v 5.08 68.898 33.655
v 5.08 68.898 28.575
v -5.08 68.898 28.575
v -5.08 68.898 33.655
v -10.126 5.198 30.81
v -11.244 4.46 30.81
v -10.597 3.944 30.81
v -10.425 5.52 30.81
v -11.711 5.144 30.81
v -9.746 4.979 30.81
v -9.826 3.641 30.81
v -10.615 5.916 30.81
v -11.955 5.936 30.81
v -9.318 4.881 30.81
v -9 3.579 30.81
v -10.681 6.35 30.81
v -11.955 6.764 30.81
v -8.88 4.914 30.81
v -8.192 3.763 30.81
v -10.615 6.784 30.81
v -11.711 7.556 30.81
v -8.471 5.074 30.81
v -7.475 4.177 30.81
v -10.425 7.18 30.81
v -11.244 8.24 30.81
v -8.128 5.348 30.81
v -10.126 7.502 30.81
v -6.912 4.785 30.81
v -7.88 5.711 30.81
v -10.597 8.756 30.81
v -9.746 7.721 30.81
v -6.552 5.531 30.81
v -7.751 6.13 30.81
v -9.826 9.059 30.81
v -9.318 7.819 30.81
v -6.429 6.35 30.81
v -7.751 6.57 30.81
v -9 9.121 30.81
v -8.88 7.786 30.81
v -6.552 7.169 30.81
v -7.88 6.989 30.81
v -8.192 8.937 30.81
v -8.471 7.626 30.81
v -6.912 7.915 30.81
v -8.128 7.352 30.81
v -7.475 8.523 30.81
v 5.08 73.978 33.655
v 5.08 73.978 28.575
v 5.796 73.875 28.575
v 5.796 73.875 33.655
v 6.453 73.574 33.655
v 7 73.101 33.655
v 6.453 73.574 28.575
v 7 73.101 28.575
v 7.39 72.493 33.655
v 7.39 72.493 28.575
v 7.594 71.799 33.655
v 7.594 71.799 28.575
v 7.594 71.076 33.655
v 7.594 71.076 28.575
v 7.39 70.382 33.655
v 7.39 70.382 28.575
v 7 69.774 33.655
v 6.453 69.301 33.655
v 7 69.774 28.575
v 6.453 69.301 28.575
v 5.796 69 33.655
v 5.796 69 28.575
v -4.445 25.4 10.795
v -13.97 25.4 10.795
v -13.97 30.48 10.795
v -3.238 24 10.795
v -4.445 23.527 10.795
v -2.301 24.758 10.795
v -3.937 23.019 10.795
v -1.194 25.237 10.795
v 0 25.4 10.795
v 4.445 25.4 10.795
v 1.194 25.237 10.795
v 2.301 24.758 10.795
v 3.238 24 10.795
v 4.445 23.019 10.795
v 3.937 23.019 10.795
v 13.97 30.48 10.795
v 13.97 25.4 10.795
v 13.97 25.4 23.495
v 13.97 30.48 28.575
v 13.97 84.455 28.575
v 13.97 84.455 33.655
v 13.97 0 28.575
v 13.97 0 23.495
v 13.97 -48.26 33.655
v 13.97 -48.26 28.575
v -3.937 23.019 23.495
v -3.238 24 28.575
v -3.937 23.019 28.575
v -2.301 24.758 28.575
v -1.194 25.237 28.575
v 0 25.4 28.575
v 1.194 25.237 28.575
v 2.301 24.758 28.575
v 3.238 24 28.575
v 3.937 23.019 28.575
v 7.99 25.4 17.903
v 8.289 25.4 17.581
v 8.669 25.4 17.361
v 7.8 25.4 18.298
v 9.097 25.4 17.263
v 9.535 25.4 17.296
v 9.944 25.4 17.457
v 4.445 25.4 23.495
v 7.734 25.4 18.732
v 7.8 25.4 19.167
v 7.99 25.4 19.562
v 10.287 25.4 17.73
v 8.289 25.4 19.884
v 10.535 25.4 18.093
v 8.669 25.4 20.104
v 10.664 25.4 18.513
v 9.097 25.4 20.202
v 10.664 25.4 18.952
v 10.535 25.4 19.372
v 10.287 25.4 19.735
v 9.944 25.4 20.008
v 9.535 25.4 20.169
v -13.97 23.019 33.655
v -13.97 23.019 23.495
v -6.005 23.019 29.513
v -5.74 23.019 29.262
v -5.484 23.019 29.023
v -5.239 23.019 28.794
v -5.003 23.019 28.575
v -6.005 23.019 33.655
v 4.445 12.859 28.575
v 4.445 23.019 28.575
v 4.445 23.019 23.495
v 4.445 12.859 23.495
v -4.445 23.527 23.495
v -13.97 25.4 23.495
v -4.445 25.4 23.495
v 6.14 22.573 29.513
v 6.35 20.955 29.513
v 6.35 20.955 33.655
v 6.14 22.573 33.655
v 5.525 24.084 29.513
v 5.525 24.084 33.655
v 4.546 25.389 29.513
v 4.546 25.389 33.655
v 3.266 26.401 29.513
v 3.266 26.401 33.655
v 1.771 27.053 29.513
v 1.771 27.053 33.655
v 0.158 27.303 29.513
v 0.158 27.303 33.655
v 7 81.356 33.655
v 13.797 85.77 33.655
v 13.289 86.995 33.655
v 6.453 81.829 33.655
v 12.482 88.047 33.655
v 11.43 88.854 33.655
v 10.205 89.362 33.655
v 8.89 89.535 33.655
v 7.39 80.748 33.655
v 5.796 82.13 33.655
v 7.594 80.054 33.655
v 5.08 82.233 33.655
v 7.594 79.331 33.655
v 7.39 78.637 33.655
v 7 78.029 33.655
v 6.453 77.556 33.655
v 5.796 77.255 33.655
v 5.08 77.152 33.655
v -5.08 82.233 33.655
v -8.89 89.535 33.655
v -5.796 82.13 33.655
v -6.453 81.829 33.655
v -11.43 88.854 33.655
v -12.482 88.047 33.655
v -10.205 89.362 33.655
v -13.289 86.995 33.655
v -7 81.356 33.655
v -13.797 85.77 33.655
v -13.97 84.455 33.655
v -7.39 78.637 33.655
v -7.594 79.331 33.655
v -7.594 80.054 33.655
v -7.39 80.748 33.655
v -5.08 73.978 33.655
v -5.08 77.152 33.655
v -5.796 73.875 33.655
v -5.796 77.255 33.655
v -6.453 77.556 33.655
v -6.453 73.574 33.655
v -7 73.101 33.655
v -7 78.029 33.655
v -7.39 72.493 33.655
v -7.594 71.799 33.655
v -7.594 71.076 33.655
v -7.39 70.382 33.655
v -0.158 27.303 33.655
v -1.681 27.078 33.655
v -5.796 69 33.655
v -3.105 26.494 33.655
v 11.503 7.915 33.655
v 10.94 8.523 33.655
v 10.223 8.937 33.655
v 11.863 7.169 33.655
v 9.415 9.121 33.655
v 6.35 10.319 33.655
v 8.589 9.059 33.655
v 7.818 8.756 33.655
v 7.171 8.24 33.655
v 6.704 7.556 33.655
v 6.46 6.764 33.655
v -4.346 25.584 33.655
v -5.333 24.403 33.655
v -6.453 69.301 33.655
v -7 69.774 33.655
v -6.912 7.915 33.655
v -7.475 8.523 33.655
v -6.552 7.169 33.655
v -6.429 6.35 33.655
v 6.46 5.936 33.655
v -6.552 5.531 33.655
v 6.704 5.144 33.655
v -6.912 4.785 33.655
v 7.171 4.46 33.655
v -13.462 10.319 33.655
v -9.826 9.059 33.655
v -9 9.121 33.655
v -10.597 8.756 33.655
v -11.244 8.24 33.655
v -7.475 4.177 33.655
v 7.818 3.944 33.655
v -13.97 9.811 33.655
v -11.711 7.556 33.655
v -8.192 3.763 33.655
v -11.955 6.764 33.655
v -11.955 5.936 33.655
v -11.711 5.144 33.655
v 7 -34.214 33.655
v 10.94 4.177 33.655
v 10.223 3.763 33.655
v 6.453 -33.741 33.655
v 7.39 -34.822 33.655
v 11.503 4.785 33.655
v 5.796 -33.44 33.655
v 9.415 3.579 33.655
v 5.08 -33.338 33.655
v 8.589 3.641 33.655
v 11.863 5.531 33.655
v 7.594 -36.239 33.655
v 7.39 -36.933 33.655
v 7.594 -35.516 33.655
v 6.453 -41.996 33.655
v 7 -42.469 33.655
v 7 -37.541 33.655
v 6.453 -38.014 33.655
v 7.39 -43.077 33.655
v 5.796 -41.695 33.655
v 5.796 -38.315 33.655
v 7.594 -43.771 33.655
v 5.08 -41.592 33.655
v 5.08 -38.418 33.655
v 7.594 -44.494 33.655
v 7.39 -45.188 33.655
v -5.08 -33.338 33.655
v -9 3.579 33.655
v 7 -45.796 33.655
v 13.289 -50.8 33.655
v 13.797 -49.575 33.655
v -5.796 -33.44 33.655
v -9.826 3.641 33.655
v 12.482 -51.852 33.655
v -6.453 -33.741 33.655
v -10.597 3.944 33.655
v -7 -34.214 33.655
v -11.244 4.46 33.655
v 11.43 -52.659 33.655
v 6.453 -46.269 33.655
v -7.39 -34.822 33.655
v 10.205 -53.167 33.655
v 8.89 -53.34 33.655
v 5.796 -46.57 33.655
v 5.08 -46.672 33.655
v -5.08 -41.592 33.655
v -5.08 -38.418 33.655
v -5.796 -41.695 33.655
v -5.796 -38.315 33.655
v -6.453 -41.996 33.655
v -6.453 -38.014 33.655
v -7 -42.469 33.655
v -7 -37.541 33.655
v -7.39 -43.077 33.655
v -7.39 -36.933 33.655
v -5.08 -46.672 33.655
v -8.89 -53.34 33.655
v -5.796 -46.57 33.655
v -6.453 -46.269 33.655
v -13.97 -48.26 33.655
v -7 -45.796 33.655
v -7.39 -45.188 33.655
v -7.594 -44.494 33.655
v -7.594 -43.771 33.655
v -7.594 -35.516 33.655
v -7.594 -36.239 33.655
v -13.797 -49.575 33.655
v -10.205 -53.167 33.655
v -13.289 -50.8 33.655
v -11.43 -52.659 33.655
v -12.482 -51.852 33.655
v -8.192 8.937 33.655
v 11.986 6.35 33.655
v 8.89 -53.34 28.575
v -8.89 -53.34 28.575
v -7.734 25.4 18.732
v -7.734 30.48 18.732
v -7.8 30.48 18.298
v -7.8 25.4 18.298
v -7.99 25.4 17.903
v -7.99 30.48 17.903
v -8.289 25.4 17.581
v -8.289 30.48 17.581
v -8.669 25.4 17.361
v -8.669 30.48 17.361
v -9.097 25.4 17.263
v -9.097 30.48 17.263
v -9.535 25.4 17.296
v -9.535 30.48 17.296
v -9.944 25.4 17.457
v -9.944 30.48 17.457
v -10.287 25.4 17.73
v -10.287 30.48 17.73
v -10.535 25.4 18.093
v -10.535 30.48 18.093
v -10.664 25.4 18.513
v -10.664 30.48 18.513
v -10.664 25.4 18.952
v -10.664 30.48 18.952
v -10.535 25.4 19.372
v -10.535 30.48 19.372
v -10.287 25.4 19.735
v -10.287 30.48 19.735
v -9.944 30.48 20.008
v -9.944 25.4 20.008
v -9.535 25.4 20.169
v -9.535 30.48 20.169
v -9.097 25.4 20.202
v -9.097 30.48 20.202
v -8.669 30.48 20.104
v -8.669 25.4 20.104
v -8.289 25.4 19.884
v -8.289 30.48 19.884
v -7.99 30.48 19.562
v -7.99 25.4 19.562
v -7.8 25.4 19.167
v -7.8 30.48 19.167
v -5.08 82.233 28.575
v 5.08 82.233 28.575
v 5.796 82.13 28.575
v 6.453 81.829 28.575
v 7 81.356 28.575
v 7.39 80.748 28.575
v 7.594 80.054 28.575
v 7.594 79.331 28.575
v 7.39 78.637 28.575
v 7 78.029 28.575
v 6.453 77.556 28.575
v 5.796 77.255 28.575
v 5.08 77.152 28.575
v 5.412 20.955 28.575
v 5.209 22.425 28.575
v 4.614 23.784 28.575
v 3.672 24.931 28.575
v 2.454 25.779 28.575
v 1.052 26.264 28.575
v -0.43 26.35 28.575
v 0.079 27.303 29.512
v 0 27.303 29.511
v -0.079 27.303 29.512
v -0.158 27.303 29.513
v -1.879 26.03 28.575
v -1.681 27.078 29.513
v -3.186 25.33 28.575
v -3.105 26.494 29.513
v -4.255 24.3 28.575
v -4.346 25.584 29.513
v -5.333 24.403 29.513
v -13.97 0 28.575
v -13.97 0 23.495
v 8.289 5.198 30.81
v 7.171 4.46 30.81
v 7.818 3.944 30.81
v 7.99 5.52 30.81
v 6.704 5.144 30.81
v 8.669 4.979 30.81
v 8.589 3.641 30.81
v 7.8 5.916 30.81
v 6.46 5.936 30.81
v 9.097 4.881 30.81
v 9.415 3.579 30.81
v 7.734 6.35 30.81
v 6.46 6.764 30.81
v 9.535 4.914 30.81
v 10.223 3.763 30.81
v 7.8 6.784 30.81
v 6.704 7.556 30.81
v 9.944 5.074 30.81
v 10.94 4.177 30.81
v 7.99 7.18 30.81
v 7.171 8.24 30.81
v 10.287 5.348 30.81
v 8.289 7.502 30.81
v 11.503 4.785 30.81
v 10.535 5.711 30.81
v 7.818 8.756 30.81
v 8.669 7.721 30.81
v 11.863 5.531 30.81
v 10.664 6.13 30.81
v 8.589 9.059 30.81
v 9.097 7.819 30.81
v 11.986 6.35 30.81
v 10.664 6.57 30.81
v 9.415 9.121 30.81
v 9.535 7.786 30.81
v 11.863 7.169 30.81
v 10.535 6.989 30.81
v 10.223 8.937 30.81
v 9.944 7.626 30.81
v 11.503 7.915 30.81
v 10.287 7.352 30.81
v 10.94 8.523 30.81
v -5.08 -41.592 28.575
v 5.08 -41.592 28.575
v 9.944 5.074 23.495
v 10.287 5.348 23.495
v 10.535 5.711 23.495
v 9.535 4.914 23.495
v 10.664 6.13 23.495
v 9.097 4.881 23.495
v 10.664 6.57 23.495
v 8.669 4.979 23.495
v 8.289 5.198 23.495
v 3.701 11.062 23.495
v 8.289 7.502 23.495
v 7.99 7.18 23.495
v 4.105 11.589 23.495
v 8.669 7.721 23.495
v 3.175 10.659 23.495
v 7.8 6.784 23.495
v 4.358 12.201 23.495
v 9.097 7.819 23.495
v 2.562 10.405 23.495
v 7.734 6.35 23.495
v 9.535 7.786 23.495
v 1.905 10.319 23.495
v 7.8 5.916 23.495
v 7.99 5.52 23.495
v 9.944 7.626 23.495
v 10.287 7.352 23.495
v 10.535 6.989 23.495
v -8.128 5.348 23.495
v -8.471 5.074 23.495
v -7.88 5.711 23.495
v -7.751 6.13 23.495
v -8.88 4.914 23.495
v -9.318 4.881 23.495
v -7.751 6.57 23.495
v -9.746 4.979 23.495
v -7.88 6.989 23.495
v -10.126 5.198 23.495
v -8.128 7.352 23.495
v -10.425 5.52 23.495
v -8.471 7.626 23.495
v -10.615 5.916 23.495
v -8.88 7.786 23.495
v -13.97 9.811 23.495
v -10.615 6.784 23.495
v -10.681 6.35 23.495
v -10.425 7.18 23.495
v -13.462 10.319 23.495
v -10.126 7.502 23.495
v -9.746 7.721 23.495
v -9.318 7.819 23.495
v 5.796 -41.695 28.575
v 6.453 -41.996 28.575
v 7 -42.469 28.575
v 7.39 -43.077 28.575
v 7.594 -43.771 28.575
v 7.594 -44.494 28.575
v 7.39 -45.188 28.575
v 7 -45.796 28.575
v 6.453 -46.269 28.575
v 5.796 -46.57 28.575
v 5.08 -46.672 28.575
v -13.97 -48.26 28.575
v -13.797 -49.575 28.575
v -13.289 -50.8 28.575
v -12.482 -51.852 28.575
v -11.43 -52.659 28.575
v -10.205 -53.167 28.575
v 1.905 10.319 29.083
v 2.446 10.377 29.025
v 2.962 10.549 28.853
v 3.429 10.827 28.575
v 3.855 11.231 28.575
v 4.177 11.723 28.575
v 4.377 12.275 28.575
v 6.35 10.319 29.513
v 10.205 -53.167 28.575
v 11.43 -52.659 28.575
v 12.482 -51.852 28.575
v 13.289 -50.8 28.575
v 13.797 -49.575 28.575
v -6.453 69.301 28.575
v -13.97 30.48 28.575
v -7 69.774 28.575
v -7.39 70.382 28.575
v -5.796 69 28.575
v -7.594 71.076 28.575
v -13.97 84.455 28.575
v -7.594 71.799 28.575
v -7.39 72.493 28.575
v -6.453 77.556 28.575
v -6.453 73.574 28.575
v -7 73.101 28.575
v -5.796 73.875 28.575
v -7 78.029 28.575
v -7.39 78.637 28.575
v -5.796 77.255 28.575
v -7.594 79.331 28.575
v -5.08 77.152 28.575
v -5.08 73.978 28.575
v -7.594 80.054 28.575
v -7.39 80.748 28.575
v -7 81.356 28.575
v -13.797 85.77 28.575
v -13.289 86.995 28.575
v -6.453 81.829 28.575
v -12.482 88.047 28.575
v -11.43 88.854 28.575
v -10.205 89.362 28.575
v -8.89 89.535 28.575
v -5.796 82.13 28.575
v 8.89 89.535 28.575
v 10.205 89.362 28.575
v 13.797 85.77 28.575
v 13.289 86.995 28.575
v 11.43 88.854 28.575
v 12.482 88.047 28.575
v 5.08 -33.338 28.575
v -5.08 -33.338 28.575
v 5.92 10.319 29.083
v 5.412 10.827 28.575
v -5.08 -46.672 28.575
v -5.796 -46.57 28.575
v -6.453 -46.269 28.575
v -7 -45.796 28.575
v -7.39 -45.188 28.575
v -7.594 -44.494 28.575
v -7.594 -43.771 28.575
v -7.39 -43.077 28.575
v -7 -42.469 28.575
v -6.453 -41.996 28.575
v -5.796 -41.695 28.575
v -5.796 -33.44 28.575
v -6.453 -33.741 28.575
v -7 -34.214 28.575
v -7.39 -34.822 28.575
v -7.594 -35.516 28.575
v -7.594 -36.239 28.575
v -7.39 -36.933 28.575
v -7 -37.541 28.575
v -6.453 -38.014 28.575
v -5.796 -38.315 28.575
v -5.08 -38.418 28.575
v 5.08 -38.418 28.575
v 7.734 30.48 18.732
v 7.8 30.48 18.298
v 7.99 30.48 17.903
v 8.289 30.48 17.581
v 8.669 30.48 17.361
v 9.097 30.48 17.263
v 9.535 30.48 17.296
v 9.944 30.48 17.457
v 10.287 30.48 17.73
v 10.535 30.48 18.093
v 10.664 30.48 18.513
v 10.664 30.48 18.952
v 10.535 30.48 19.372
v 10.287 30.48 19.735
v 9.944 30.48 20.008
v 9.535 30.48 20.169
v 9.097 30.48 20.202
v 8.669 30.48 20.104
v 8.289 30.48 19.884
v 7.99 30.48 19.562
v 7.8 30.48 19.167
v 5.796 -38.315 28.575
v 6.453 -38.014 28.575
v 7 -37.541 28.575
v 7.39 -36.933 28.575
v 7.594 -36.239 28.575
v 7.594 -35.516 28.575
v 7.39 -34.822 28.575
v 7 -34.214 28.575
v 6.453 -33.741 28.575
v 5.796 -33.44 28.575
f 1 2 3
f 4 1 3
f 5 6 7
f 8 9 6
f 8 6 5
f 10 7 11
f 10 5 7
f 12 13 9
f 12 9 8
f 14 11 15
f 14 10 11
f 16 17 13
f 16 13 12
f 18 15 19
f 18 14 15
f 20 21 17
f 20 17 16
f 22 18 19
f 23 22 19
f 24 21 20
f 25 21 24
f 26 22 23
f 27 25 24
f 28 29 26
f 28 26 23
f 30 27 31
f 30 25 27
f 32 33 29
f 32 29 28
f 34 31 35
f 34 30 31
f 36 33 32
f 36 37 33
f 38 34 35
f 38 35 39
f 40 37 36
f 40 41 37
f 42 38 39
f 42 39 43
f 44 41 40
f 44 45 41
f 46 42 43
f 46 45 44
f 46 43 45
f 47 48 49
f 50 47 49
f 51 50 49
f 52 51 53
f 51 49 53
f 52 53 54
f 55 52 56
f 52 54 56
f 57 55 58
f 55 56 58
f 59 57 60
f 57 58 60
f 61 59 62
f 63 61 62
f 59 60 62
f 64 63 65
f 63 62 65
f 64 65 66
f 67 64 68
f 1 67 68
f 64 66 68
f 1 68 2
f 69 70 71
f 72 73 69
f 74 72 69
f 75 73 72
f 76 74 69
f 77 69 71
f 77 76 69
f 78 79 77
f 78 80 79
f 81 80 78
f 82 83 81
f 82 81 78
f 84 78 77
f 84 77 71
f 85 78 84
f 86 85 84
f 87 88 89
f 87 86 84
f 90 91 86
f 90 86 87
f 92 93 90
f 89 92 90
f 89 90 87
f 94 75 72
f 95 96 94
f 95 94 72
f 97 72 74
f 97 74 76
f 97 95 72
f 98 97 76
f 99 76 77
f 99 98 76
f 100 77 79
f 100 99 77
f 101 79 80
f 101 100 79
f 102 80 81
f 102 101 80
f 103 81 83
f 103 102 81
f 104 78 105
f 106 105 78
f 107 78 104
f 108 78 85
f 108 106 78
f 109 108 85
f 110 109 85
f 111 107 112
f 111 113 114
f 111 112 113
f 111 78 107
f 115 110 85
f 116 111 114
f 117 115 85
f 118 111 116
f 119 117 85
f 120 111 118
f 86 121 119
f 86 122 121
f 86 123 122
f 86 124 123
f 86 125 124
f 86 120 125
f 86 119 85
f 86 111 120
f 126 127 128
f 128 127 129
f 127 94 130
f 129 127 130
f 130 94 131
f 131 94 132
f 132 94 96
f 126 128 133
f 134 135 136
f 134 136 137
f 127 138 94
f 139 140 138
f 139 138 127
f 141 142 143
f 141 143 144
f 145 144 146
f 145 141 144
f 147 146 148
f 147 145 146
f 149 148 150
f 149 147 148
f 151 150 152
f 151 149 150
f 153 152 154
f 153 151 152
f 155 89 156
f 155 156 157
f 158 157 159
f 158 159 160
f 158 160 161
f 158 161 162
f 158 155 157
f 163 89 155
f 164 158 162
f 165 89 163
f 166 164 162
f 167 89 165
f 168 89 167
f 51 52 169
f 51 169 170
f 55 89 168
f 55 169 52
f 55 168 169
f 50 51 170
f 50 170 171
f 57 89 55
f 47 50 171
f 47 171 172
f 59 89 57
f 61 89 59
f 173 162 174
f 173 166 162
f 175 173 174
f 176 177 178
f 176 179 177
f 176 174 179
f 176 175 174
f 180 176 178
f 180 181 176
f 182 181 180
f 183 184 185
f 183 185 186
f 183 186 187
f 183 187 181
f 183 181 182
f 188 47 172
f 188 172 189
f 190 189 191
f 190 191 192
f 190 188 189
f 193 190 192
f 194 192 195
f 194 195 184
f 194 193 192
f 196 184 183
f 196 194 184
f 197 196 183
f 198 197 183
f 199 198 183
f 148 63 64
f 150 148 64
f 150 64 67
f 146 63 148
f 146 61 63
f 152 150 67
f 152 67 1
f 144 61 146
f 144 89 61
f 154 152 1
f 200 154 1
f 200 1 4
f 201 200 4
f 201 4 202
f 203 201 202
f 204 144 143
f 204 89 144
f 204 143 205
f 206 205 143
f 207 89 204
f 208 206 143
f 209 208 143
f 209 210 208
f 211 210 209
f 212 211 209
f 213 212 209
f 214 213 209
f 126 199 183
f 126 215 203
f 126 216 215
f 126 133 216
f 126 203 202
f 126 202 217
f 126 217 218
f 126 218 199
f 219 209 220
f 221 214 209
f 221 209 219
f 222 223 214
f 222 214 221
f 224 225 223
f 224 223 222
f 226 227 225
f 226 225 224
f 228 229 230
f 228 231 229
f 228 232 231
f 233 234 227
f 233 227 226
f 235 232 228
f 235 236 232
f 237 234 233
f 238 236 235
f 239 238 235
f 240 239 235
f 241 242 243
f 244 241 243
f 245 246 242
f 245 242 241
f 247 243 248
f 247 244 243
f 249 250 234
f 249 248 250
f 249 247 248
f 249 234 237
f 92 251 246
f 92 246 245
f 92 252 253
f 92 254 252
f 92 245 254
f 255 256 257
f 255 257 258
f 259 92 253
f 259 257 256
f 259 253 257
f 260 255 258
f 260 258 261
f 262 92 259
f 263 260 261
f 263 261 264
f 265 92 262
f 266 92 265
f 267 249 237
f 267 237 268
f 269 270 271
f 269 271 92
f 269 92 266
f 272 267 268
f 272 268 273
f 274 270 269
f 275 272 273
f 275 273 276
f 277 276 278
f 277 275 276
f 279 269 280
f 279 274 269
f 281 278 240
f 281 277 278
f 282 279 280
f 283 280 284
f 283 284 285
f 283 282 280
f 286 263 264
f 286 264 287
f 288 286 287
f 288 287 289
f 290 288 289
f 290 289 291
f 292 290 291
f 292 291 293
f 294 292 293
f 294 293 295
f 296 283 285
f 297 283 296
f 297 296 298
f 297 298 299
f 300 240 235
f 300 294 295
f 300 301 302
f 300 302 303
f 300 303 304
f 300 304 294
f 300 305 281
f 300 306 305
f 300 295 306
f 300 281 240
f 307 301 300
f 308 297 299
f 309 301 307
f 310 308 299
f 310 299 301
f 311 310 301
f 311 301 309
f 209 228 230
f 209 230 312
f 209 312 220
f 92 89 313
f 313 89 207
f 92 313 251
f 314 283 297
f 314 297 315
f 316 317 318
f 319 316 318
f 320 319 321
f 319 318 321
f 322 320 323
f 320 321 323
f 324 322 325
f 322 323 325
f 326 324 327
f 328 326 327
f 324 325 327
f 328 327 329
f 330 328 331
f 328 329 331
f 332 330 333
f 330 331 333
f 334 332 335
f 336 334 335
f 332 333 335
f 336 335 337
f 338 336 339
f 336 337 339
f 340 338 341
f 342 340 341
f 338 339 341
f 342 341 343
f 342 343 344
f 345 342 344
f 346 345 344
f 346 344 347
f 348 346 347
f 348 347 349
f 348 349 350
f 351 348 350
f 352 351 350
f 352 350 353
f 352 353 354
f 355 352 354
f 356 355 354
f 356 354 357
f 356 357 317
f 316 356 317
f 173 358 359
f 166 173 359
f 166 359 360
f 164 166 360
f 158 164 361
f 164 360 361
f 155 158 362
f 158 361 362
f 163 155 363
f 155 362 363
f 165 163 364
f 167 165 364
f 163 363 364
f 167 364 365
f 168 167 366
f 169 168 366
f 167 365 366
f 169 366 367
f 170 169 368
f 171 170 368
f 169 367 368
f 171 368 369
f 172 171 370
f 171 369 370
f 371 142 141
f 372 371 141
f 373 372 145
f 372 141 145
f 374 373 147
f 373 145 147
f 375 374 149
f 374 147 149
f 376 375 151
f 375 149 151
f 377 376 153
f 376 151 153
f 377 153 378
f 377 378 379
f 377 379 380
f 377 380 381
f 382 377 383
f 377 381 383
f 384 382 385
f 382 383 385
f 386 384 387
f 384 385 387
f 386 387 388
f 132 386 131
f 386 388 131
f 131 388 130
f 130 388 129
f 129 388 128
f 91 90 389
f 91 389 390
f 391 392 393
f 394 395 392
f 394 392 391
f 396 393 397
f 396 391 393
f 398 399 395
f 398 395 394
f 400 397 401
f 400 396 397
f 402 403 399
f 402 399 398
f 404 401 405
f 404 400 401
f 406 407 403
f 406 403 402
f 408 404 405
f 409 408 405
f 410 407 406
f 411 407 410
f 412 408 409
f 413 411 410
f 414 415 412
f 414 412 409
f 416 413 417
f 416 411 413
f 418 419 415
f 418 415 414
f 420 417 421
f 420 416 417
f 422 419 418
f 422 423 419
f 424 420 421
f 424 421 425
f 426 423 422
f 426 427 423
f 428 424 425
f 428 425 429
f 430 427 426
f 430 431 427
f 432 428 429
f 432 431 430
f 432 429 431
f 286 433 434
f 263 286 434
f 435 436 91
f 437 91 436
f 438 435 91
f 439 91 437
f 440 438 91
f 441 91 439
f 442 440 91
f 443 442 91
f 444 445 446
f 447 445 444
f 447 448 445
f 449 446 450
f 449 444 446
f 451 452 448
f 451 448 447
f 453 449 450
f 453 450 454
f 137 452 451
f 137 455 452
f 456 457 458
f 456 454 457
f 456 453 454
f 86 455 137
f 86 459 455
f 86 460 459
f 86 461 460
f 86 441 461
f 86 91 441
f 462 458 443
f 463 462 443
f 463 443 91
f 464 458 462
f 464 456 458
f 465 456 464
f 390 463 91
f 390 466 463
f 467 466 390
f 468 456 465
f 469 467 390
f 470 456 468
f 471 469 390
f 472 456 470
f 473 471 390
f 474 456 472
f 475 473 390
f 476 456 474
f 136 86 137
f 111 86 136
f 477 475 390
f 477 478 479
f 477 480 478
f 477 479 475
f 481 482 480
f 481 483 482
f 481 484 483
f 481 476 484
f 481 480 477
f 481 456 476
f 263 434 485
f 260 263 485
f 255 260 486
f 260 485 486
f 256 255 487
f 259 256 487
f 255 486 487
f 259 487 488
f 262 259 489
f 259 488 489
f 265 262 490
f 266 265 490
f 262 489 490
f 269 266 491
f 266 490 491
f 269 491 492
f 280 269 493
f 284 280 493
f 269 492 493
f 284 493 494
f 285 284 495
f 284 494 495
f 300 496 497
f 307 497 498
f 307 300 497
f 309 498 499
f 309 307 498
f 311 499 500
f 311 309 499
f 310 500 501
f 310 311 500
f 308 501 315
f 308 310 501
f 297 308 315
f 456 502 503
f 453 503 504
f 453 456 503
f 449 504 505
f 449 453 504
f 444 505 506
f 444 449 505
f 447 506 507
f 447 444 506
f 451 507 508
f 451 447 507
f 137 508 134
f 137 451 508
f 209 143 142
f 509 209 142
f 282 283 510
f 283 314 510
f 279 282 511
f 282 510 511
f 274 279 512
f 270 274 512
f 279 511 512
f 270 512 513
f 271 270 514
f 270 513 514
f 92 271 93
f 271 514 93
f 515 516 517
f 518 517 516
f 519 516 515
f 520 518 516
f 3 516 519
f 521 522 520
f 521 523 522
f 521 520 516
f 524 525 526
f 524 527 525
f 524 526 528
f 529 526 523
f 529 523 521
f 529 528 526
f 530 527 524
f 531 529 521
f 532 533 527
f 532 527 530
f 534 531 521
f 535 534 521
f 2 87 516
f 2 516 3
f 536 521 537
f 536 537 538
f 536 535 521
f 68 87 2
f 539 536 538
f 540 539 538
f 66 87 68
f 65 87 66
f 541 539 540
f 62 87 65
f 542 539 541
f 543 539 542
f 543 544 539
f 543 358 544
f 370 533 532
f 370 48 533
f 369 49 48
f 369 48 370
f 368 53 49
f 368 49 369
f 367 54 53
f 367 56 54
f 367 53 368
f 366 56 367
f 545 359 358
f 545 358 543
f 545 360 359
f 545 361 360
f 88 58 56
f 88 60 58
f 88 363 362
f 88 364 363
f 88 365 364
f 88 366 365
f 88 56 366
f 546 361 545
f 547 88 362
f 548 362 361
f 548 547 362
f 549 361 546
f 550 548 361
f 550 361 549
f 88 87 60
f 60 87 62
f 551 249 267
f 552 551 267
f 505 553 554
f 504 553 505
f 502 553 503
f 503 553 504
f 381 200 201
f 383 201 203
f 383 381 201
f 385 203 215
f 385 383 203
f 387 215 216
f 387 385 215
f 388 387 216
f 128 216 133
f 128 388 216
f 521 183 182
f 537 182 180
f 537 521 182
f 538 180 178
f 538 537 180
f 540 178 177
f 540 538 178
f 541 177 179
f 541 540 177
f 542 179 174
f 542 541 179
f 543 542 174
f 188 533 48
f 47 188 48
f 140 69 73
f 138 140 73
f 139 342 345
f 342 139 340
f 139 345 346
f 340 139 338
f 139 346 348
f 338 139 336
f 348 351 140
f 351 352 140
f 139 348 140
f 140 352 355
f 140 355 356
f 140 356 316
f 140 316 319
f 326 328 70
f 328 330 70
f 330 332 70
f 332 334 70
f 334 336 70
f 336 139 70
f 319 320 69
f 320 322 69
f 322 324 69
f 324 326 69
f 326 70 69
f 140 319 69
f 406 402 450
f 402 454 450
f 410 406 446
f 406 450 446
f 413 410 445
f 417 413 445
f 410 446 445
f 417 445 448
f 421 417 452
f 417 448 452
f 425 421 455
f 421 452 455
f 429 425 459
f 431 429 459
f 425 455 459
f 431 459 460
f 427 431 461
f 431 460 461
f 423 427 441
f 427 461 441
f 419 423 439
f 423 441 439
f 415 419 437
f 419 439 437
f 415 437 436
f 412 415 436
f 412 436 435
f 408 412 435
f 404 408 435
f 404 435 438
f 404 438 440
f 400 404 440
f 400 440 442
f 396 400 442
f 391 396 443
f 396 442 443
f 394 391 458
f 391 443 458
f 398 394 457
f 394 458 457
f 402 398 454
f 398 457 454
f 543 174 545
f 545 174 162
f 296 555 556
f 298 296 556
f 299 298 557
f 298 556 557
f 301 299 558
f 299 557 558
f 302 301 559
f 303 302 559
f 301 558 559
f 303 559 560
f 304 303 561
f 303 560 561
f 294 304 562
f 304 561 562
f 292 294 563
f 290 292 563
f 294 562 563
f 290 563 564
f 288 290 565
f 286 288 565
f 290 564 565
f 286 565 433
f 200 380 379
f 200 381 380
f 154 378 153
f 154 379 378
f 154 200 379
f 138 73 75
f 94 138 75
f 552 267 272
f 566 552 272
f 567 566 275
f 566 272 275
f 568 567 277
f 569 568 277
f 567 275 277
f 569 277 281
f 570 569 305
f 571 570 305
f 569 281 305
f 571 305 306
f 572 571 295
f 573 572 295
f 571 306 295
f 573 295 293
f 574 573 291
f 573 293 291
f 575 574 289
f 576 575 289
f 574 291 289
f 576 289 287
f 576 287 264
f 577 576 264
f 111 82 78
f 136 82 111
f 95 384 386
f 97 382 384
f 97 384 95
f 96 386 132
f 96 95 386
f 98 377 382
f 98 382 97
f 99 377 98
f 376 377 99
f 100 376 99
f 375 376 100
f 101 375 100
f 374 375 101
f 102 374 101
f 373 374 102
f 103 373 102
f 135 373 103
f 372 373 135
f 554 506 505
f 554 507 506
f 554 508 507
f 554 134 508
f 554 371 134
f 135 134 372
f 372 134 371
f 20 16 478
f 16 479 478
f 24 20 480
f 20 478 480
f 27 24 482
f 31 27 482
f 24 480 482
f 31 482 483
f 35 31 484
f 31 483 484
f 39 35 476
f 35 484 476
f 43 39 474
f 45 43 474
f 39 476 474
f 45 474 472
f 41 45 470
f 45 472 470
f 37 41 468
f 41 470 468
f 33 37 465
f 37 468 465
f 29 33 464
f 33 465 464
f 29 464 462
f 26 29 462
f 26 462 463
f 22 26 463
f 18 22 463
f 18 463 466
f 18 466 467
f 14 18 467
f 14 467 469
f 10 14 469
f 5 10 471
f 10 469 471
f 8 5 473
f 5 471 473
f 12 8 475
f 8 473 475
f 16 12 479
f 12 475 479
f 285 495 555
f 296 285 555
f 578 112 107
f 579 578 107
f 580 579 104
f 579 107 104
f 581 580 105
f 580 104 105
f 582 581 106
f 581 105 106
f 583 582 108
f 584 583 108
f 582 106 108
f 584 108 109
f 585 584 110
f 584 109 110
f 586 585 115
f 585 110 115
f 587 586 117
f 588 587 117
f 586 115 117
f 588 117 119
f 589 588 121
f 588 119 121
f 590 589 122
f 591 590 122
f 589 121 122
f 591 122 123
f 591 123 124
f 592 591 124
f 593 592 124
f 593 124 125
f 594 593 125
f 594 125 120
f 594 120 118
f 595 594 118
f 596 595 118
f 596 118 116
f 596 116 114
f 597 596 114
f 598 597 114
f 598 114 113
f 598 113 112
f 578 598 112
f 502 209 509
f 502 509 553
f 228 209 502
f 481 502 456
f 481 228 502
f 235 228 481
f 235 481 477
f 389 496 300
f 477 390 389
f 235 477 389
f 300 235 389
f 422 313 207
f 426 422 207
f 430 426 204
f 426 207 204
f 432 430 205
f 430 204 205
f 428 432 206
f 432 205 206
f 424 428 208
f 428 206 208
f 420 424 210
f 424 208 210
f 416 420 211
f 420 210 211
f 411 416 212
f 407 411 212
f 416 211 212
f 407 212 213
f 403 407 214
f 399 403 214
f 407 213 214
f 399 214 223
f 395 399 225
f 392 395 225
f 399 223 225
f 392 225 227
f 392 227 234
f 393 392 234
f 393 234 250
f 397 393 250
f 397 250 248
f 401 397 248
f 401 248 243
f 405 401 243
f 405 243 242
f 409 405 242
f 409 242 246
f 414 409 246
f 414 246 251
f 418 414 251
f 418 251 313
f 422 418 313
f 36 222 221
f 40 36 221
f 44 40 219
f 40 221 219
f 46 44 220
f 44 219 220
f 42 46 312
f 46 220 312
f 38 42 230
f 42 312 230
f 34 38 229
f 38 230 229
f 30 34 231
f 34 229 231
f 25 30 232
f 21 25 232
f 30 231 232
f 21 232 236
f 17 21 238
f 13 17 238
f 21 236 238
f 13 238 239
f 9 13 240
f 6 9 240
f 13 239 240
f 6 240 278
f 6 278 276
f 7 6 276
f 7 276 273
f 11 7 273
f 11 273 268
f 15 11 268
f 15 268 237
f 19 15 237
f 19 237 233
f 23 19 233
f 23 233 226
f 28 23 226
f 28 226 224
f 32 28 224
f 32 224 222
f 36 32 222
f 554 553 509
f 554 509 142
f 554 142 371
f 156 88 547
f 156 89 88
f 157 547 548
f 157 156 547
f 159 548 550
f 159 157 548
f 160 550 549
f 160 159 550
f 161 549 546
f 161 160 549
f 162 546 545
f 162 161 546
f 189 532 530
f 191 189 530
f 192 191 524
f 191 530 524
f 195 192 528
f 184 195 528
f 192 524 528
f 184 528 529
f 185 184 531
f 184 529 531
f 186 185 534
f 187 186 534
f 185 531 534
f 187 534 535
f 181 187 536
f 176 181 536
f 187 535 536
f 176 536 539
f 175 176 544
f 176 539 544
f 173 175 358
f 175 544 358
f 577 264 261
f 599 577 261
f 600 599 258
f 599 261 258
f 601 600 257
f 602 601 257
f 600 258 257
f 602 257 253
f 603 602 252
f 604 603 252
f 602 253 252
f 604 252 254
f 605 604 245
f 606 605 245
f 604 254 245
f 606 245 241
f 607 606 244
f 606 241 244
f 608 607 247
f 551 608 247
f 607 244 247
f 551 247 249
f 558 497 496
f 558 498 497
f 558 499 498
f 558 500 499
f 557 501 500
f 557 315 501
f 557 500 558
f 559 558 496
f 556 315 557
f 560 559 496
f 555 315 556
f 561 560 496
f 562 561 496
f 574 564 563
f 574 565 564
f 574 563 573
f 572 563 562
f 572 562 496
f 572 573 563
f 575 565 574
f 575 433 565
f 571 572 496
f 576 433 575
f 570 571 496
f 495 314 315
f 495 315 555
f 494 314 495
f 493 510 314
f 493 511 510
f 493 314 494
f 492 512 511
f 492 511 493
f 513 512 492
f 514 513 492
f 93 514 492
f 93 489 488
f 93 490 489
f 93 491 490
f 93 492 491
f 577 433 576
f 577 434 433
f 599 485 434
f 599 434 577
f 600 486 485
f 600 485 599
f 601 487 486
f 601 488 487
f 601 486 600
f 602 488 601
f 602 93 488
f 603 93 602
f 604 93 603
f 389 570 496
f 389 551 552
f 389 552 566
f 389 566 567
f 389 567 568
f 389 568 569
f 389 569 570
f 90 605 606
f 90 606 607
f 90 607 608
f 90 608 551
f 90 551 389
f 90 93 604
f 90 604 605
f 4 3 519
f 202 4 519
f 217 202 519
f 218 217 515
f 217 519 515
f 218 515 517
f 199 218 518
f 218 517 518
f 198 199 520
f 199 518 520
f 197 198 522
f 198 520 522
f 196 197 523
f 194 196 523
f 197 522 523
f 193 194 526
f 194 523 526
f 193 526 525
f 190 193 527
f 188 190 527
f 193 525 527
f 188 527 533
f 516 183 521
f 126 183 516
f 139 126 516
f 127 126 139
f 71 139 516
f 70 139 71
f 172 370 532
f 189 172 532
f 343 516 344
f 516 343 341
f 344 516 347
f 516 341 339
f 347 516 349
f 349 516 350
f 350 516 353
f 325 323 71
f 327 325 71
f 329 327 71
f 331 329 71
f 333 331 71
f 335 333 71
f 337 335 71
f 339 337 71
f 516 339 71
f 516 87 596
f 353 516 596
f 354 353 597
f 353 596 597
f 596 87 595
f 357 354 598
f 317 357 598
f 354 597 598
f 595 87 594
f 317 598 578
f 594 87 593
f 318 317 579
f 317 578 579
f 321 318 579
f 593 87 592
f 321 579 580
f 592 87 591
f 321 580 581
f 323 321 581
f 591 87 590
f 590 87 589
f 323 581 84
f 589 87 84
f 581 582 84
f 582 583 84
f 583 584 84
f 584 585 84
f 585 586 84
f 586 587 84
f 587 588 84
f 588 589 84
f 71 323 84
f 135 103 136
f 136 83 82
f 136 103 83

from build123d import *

# Parameters (mm, degrees)
BOSS_EXTRUDE1_DEPTH                                = 5.080000000000001
SKETCH2_W                                          = 5.079999999999998
SKETCH2_H                                          = 0.5079999999999831
BOSS_EXTRUDE2_DEPTH                                = 17.907000000000004
BOSS_EXTRUDE3_DEPTH                                = 1.9049999999999987
BOSS_EXTRUDE4_DEPTH                                = 17.779999999999998
SKETCH5_W                                          = 20.31999999999999
SKETCH5_H                                          = 22.859999999999992
BOSS_EXTRUDE5_DEPTH                                = 63.1505057547775
BOSS_EXTRUDE6_DEPTH                                = 10.03299999999999
BOSS_EXTRUDE7_DEPTH                                = 5.079999999999997
SKETCH8_W                                          = 22.859999999999992
SKETCH8_H                                          = 80.6430229523153
BOSS_EXTRUDE8_DEPTH                                = 7.619999999999997
CUT_EXTRUDE1_DEPTH                                 = 12.699999999999996
CUT_EXTRUDE2_DEPTH                                 = 12.699999999999998
BOSS_EXTRUDE9_DEPTH                                = 5.079999999999997
BOSS_EXTRUDE10_DEPTH                               = 62.23197704768469
SKETCH13_W                                         = 9.524999999999991
SKETCH13_H                                         = 12.699999999999998
CUT_EXTRUDE3_DEPTH                                 = 2.381494245222503
SKETCH14_W                                         = 17.779999999999994
SKETCH14_H                                         = 59.05499999999999
CUT_EXTRUDE4_DEPTH                                 = 100.64847640581364
SKETCH15_W                                         = 5.079999999999998
SKETCH15_H                                         = 53.339999999999996
CUT_EXTRUDE5_DEPTH                                 = 100.64847640581364
CUT_EXTRUDE6_DEPTH                                 = 93.34611808300336
CUT_EXTRUDE7_DEPTH                                 = 94.45724543875664
CUT_EXTRUDE8_DEPTH                                 = 93.34611808300336
CUT_EXTRUDE9_DEPTH                                 = 93.34611808300336
CBORE_FOR_M2_5_HEX_HEAD_MACHINE_SCREW1_D           = 2.9464
CBORE_FOR_M2_5_HEX_HEAD_MACHINE_SCREW1_DEPTH       = 22.86
CBORE_FOR_M2_5_HEX_HEAD_MACHINE_SCREW1_CBORE_D     = 5.55752
CBORE_FOR_M2_5_HEX_HEAD_MACHINE_SCREW1_CBORE_DEPTH = 2.8448
M2_5_CLEARANCE_HOLE1_D                             = 2.9464
M2_5_CLEARANCE_HOLE1_DEPTH                         = 83.82
M2_5_CLEARANCE_HOLE2_D                             = 2.9464
M2_5_CLEARANCE_HOLE2_DEPTH                         = 64.135
FILLET2_R                                          = 2.540000000000001
CHAMFER2_SIZE                                      = 0.938019803
FILLET3_R                                          = 5.079999999999999


with BuildPart() as part:
    # Sketch1 → Boss-Extrude1 (new body)
    with BuildSketch(Plane.XY.offset(33.654999999999994)):
        Polygon((-13.96999999999999, 9.810505754777516), (-13.461999999999998, 9.810505754777516), (-13.461999999999998, 10.3185057547775), align=None)
    extrude(amount=-BOSS_EXTRUDE1_DEPTH)

    # Sketch2 → Boss-Extrude2 (add)
    with BuildSketch(Plane(origin=(-13.461999999999998, 0, 0), x_dir=(0, 0, -1), z_dir=(1, 0, 0))):
        with Locations((-31.114999999999995, 10.064505754777507)):
            Rectangle(SKETCH2_W, SKETCH2_H)
    extrude(amount=BOSS_EXTRUDE2_DEPTH)

    # Sketch3 → Boss-Extrude3 (add)
    with BuildSketch(Plane(origin=(4.445000000000005, 0, 0), x_dir=(0, 0, -1), z_dir=(1, 0, 0))):
        Polygon((-28.574999999999996, 9.810505754777516), (-33.654999999999994, 9.810505754777516), (-33.654999999999994, 10.3185057547775), (-29.083000000000002, 10.3185057547775), (-28.574999999999996, 10.826505754777498), align=None)
    extrude(amount=BOSS_EXTRUDE3_DEPTH)

    # Sketch4 → Boss-Extrude4 (add)
    with BuildSketch(Plane(origin=(0, 0, 28.574999999999996), x_dir=(-1, 0, 0), z_dir=(0, 0, -1))):
        with BuildLine():
            Line((-6.3500000000000005, 9.810505754777516), (-6.349999999999998, 27.303022952315306))
            Line((-6.349999999999998, 27.303022952315306), (3.93700000000001, 27.303022952315306))
            Line((3.93700000000001, 27.303022952315306), (3.93700000000001, 23.0185057547775))
            ThreePointArc((3.93700000000001, 23.0185057547775), (-2.14e-15, 25.399999999999995), (-3.9370000000000167, 23.0185057547775))
            Line((-3.9370000000000167, 23.0185057547775), (-4.445000000000012, 23.0185057547775))
            Line((-4.445000000000012, 23.0185057547775), (-4.445000000000001, 10.3185057547775))
            Line((-4.445000000000001, 10.3185057547775), (13.46200000000004, 10.3185057547775))
            Line((13.46200000000004, 10.3185057547775), (13.969999999999992, 9.810505754777516))
            Line((13.969999999999992, 9.810505754777516), (-6.3500000000000005, 9.810505754777516))
        make_face()
    extrude(amount=BOSS_EXTRUDE4_DEPTH)

    # Sketch5 → Boss-Extrude5 (add)
    with BuildSketch(Plane.XZ.offset(-9.810505754777516)):
        with Locations((-3.8099999999999947, 22.224999999999998)):
            Rectangle(SKETCH5_W, SKETCH5_H)
    extrude(amount=BOSS_EXTRUDE5_DEPTH)

    # Sketch6 → Boss-Extrude6 (add)
    with BuildSketch(Plane.ZY.offset(3.93700000000001)):
        Polygon((28.575, 23.0185057547775), (10.795, 23.0185057547775), (10.794999999999998, 27.303022952315306), (28.575, 27.303022952315306), align=None)
    extrude(amount=BOSS_EXTRUDE6_DEPTH)

    # Sketch7 → Boss-Extrude7 (add)
    with BuildSketch(Plane.XY.offset(28.574999999999996)):
        with BuildLine():
            Line((0.15844430213195376, 27.303022952315306), (6.3500000000000005, 27.303022952315306))
            Line((6.3500000000000005, 27.303022952315306), (6.3500000000000005, 20.955000000000002))
            ThreePointArc((6.3500000000000005, 20.955000000000002), (4.545801432010527, 25.38875566994067), (0.15844430213195376, 27.303022952315306))
        make_face()
    extrude(amount=BOSS_EXTRUDE7_DEPTH)

    # Sketch8 → Boss-Extrude8 (add)
    with BuildSketch(Plane(origin=(6.350000000000003, 0, 0), x_dir=(0, 0, -1), z_dir=(1, 0, 0))):
        with Locations((-22.224999999999998, -13.018488523842345)):
            Rectangle(SKETCH8_W, SKETCH8_H)
    extrude(amount=BOSS_EXTRUDE8_DEPTH)

    # Sketch9 → Cut-Extrude1 (cut)
    with BuildSketch(Plane(origin=(0, 0, 10.794999999999998), x_dir=(-1, 0, 0), z_dir=(0, 0, -1))):
        Polygon((13.97, 25.4), (4.44500000000001, 25.4), (4.445000000000009, 23.526505754777506), (3.9369999999999985, 23.0185057547775), (13.97, 23.0185057547775), align=None)
    extrude(amount=-CUT_EXTRUDE1_DEPTH, mode=Mode.SUBTRACT)

    # Sketch10 → Cut-Extrude2 (cut)
    with BuildSketch(Plane(origin=(0, 0, 10.794999999999998), x_dir=(-1, 0, 0), z_dir=(0, 0, -1))):
        Polygon((-4.445000000000001, 10.3185057547775), (-4.44500000000001, 23.018505754777497), (-13.97, 23.018505754777497), (-13.97, -53.339999999999996), (13.969999999999992, -53.339999999999996), (13.970000000000004, 9.81050575477752), (13.46200000000004, 10.3185057547775), align=None)
    extrude(amount=-CUT_EXTRUDE2_DEPTH, mode=Mode.SUBTRACT)

    # Sketch11 → Boss-Extrude9 (add)
    with BuildSketch(Plane.XY.offset(28.574999999999996)):
        with BuildLine():
            Line((-6.005367932108752, 23.0185057547775), (-13.97, 23.0185057547775))
            Line((-13.97, 23.0185057547775), (-13.97, 27.303022952315306))
            Line((-13.97, 27.303022952315306), (-0.15844430213195376, 27.303022952315306))
            ThreePointArc((-0.15844430213195376, 27.303022952315306), (-3.7533208254481982, 26.077019404615417), (-6.005367932108752, 23.0185057547775))
        make_face()
    extrude(amount=BOSS_EXTRUDE9_DEPTH)

    # Sketch12 → Boss-Extrude10 (add)
    with BuildSketch(Plane(origin=(0, 27.303022952315306, 0), x_dir=(-1, 0, 0), z_dir=(0, 1, 0))):
        Polygon((-13.97, 33.654999999999994), (13.97, 33.654999999999994), (13.97, 10.794999999999998), (-13.97, 10.795), align=None)
    extrude(amount=BOSS_EXTRUDE10_DEPTH)

    # Sketch13 → Cut-Extrude3 (cut)
    with BuildSketch(Plane.XZ.offset(-23.0185057547775)):
        with Locations((9.207500000000005, 17.145)):
            Rectangle(SKETCH13_W, SKETCH13_H)
    extrude(amount=-CUT_EXTRUDE3_DEPTH, mode=Mode.SUBTRACT)

    # Sketch14 → Cut-Extrude4 (cut, through all)
    with BuildSketch(Plane(origin=(13.97, 0, 0), x_dir=(0, 0, -1), z_dir=(1, 0, 0))):
        with Locations((-19.685, 60.0075)):
            Rectangle(SKETCH14_W, SKETCH14_H)
    extrude(amount=-CUT_EXTRUDE4_DEPTH, mode=Mode.SUBTRACT)

    # Sketch15 → Cut-Extrude5 (cut, through all)
    with BuildSketch(Plane(origin=(13.97, 0, 0), x_dir=(0, 0, -1), z_dir=(1, 0, 0))):
        with Locations((-26.034999999999997, -26.669999999999998)):
            Rectangle(SKETCH15_W, SKETCH15_H)
    extrude(amount=-CUT_EXTRUDE5_DEPTH, mode=Mode.SUBTRACT)

    # Sketch16 → Cut-Extrude6 (cut, through all)
    with BuildSketch(Plane(origin=(0, 0, 28.575), x_dir=(-1, 0, 0), z_dir=(0, 0, -1))):
        with BuildLine():
            Line((5.08, -41.592499999999994), (-5.08, -41.592499999999994))
            ThreePointArc((-5.08, -41.592499999999994), (-7.620000000000006, -44.1325), (-5.08, -46.6725))
            Line((-5.08, -46.6725), (5.08, -46.6725))
            ThreePointArc((5.08, -46.6725), (7.619999999999999, -44.1325), (5.08, -41.592499999999994))
        make_face()
    extrude(amount=-CUT_EXTRUDE6_DEPTH, mode=Mode.SUBTRACT)

    # Sketch17 → Cut-Extrude7 (cut, through all)
    with BuildSketch(Plane.XY.offset(33.654999999999994)):
        with BuildLine():
            Line((-5.08, -38.4175), (5.08, -38.4175))
            ThreePointArc((5.08, -38.4175), (7.619999999999999, -35.8775), (5.08, -33.3375))
            Line((5.08, -33.3375), (-5.08, -33.3375))
            ThreePointArc((-5.08, -33.3375), (-7.619999999999999, -35.8775), (-5.08, -38.4175))
        make_face()
    extrude(amount=-CUT_EXTRUDE7_DEPTH, mode=Mode.SUBTRACT)

    # Sketch18 → Cut-Extrude8 (cut, through all)
    with BuildSketch(Plane(origin=(0, 0, 28.575), x_dir=(-1, 0, 0), z_dir=(0, 0, -1))):
        with BuildLine():
            Line((5.08, 73.9775), (-5.08, 73.9775))
            ThreePointArc((-5.08, 73.9775), (-7.620000000000006, 71.4375), (-5.08, 68.8975))
            Line((-5.08, 68.8975), (5.08, 68.8975))
            ThreePointArc((5.08, 68.8975), (7.620000000000006, 71.4375), (5.08, 73.9775))
        make_face()
    extrude(amount=-CUT_EXTRUDE8_DEPTH, mode=Mode.SUBTRACT)

    # Sketch19 → Cut-Extrude9 (cut, through all)
    with BuildSketch(Plane(origin=(0, 0, 28.575), x_dir=(-1, 0, 0), z_dir=(0, 0, -1))):
        with BuildLine():
            Line((5.08, 82.2325), (-5.08, 82.2325))
            ThreePointArc((-5.08, 82.2325), (-7.620000000000006, 79.6925), (-5.08, 77.1525))
            Line((-5.08, 77.1525), (5.08, 77.1525))
            ThreePointArc((5.08, 77.1525), (7.619999999999992, 79.6925), (5.08, 82.2325))
        make_face()
    extrude(amount=-CUT_EXTRUDE9_DEPTH, mode=Mode.SUBTRACT)

    # CBORE for M2.5 Hex Head Machine Screw1
    with Locations(Plane.XY.offset(33.654999999999994)):
        with Locations((9.2075, 6.35), (-9.2075, 6.35)):
            CounterBoreHole(CBORE_FOR_M2_5_HEX_HEAD_MACHINE_SCREW1_D / 2, CBORE_FOR_M2_5_HEX_HEAD_MACHINE_SCREW1_CBORE_D / 2, CBORE_FOR_M2_5_HEX_HEAD_MACHINE_SCREW1_CBORE_DEPTH, depth=CBORE_FOR_M2_5_HEX_HEAD_MACHINE_SCREW1_DEPTH)

    # M2.5 Clearance Hole1
    with Locations(Plane(origin=(0, 30.48, 0), x_dir=(1, 0, 0), z_dir=(0, 1, 0))):
        with Locations((9.2075, -18.7325)):
            Hole(M2_5_CLEARANCE_HOLE1_D / 2, depth=M2_5_CLEARANCE_HOLE1_DEPTH)

    # M2.5 Clearance Hole2
    with Locations(Plane(origin=(0, 25.4, 0), x_dir=(-1, 0, 0), z_dir=(0, -1, 0))):
        with Locations((9.2075, -18.7325)):
            Hole(M2_5_CLEARANCE_HOLE2_D / 2, depth=M2_5_CLEARANCE_HOLE2_DEPTH)

    # Fillet2
    fillet2_edges = [part.edges().sort_by_distance(p)[0] for p in [
        (4.445000000000004, 10.3185057547775, 26.289),
    ]]
    fillet(fillet2_edges, radius=FILLET2_R)

    # Chamfer2
    # the kernel refuses this chamfer: 0.938019803 mm, written as the material it adds along each edge
    with BuildSketch(Plane(origin=(3.44e-15, 20.955, 28.574999999999996), x_dir=(0.3476137543318691, 0.9376378180295966, 0), z_dir=(0.9376378180295966, -0.3476137543318691, 0))) as chamfer2_piece_1_section:
        Polygon((6.349999999999995 - CHAMFER2_SIZE, 0), (6.350000000000003, CHAMFER2_SIZE), (6.349999999999995, 0), align=None)
    chamfer2_piece_1 = revolve(axis=Axis((3.44e-15, 20.955, 28.574999999999996), (0, 0, 1)), revolution_arc=113.14940178409387, mode=Mode.PRIVATE)
    chamfer2_piece_1 = split(chamfer2_piece_1, bisect_by=Plane(origin=(-2.526546800118106, 23.0185057547775, 29.032255606191857), z_dir=(0, 1, 0)), keep=Keep.TOP, mode=Mode.PRIVATE)
    add(chamfer2_piece_1)
    with BuildSketch(Plane(origin=(6.350000000000003, 8.4142161862341, 28.574999999999996), x_dir=(0.027495876610586452, 0, 0.9996219169112966), z_dir=(-1.5e-16, 1, 0))) as chamfer2_piece_2:
        Polygon((CHAMFER2_SIZE * 0.999621916411, -CHAMFER2_SIZE * 0.0274958765968), (-CHAMFER2_SIZE * 0.0274958765968, -CHAMFER2_SIZE * 0.999621916411), (0, 0), align=None)
    extrude(amount=12.540783813765902)
    with BuildSketch(Plane(origin=(-2e-15, 20.955, 28.574999999999996), x_dir=(1, 5.6e-16, 0), z_dir=(5.6e-16, -1, 0))) as chamfer2_piece_3:
        Polygon((6.350000000000002 - CHAMFER2_SIZE, 0), (6.350000000000002, CHAMFER2_SIZE), (6.350000000000002, 0), align=None)
    revolve(axis=Axis((-2e-15, 20.955, 28.574999999999996), (0, 0, 1)), revolution_arc=110.34466934043498)

    # Fillet3
    fillet3_edges = [part.edges().sort_by_distance(p)[0] for p in [
        (13.97, -53.339999999999996, 31.114999999999995),
        (13.97, 89.535, 31.114999999999995),
        (-13.97, 89.535, 31.114999999999995),
        (-13.96999999999999, -53.33999999999998, 31.114999999999995),
    ]]
    fillet(fillet3_edges, radius=FILLET3_R)


solid = part.part
